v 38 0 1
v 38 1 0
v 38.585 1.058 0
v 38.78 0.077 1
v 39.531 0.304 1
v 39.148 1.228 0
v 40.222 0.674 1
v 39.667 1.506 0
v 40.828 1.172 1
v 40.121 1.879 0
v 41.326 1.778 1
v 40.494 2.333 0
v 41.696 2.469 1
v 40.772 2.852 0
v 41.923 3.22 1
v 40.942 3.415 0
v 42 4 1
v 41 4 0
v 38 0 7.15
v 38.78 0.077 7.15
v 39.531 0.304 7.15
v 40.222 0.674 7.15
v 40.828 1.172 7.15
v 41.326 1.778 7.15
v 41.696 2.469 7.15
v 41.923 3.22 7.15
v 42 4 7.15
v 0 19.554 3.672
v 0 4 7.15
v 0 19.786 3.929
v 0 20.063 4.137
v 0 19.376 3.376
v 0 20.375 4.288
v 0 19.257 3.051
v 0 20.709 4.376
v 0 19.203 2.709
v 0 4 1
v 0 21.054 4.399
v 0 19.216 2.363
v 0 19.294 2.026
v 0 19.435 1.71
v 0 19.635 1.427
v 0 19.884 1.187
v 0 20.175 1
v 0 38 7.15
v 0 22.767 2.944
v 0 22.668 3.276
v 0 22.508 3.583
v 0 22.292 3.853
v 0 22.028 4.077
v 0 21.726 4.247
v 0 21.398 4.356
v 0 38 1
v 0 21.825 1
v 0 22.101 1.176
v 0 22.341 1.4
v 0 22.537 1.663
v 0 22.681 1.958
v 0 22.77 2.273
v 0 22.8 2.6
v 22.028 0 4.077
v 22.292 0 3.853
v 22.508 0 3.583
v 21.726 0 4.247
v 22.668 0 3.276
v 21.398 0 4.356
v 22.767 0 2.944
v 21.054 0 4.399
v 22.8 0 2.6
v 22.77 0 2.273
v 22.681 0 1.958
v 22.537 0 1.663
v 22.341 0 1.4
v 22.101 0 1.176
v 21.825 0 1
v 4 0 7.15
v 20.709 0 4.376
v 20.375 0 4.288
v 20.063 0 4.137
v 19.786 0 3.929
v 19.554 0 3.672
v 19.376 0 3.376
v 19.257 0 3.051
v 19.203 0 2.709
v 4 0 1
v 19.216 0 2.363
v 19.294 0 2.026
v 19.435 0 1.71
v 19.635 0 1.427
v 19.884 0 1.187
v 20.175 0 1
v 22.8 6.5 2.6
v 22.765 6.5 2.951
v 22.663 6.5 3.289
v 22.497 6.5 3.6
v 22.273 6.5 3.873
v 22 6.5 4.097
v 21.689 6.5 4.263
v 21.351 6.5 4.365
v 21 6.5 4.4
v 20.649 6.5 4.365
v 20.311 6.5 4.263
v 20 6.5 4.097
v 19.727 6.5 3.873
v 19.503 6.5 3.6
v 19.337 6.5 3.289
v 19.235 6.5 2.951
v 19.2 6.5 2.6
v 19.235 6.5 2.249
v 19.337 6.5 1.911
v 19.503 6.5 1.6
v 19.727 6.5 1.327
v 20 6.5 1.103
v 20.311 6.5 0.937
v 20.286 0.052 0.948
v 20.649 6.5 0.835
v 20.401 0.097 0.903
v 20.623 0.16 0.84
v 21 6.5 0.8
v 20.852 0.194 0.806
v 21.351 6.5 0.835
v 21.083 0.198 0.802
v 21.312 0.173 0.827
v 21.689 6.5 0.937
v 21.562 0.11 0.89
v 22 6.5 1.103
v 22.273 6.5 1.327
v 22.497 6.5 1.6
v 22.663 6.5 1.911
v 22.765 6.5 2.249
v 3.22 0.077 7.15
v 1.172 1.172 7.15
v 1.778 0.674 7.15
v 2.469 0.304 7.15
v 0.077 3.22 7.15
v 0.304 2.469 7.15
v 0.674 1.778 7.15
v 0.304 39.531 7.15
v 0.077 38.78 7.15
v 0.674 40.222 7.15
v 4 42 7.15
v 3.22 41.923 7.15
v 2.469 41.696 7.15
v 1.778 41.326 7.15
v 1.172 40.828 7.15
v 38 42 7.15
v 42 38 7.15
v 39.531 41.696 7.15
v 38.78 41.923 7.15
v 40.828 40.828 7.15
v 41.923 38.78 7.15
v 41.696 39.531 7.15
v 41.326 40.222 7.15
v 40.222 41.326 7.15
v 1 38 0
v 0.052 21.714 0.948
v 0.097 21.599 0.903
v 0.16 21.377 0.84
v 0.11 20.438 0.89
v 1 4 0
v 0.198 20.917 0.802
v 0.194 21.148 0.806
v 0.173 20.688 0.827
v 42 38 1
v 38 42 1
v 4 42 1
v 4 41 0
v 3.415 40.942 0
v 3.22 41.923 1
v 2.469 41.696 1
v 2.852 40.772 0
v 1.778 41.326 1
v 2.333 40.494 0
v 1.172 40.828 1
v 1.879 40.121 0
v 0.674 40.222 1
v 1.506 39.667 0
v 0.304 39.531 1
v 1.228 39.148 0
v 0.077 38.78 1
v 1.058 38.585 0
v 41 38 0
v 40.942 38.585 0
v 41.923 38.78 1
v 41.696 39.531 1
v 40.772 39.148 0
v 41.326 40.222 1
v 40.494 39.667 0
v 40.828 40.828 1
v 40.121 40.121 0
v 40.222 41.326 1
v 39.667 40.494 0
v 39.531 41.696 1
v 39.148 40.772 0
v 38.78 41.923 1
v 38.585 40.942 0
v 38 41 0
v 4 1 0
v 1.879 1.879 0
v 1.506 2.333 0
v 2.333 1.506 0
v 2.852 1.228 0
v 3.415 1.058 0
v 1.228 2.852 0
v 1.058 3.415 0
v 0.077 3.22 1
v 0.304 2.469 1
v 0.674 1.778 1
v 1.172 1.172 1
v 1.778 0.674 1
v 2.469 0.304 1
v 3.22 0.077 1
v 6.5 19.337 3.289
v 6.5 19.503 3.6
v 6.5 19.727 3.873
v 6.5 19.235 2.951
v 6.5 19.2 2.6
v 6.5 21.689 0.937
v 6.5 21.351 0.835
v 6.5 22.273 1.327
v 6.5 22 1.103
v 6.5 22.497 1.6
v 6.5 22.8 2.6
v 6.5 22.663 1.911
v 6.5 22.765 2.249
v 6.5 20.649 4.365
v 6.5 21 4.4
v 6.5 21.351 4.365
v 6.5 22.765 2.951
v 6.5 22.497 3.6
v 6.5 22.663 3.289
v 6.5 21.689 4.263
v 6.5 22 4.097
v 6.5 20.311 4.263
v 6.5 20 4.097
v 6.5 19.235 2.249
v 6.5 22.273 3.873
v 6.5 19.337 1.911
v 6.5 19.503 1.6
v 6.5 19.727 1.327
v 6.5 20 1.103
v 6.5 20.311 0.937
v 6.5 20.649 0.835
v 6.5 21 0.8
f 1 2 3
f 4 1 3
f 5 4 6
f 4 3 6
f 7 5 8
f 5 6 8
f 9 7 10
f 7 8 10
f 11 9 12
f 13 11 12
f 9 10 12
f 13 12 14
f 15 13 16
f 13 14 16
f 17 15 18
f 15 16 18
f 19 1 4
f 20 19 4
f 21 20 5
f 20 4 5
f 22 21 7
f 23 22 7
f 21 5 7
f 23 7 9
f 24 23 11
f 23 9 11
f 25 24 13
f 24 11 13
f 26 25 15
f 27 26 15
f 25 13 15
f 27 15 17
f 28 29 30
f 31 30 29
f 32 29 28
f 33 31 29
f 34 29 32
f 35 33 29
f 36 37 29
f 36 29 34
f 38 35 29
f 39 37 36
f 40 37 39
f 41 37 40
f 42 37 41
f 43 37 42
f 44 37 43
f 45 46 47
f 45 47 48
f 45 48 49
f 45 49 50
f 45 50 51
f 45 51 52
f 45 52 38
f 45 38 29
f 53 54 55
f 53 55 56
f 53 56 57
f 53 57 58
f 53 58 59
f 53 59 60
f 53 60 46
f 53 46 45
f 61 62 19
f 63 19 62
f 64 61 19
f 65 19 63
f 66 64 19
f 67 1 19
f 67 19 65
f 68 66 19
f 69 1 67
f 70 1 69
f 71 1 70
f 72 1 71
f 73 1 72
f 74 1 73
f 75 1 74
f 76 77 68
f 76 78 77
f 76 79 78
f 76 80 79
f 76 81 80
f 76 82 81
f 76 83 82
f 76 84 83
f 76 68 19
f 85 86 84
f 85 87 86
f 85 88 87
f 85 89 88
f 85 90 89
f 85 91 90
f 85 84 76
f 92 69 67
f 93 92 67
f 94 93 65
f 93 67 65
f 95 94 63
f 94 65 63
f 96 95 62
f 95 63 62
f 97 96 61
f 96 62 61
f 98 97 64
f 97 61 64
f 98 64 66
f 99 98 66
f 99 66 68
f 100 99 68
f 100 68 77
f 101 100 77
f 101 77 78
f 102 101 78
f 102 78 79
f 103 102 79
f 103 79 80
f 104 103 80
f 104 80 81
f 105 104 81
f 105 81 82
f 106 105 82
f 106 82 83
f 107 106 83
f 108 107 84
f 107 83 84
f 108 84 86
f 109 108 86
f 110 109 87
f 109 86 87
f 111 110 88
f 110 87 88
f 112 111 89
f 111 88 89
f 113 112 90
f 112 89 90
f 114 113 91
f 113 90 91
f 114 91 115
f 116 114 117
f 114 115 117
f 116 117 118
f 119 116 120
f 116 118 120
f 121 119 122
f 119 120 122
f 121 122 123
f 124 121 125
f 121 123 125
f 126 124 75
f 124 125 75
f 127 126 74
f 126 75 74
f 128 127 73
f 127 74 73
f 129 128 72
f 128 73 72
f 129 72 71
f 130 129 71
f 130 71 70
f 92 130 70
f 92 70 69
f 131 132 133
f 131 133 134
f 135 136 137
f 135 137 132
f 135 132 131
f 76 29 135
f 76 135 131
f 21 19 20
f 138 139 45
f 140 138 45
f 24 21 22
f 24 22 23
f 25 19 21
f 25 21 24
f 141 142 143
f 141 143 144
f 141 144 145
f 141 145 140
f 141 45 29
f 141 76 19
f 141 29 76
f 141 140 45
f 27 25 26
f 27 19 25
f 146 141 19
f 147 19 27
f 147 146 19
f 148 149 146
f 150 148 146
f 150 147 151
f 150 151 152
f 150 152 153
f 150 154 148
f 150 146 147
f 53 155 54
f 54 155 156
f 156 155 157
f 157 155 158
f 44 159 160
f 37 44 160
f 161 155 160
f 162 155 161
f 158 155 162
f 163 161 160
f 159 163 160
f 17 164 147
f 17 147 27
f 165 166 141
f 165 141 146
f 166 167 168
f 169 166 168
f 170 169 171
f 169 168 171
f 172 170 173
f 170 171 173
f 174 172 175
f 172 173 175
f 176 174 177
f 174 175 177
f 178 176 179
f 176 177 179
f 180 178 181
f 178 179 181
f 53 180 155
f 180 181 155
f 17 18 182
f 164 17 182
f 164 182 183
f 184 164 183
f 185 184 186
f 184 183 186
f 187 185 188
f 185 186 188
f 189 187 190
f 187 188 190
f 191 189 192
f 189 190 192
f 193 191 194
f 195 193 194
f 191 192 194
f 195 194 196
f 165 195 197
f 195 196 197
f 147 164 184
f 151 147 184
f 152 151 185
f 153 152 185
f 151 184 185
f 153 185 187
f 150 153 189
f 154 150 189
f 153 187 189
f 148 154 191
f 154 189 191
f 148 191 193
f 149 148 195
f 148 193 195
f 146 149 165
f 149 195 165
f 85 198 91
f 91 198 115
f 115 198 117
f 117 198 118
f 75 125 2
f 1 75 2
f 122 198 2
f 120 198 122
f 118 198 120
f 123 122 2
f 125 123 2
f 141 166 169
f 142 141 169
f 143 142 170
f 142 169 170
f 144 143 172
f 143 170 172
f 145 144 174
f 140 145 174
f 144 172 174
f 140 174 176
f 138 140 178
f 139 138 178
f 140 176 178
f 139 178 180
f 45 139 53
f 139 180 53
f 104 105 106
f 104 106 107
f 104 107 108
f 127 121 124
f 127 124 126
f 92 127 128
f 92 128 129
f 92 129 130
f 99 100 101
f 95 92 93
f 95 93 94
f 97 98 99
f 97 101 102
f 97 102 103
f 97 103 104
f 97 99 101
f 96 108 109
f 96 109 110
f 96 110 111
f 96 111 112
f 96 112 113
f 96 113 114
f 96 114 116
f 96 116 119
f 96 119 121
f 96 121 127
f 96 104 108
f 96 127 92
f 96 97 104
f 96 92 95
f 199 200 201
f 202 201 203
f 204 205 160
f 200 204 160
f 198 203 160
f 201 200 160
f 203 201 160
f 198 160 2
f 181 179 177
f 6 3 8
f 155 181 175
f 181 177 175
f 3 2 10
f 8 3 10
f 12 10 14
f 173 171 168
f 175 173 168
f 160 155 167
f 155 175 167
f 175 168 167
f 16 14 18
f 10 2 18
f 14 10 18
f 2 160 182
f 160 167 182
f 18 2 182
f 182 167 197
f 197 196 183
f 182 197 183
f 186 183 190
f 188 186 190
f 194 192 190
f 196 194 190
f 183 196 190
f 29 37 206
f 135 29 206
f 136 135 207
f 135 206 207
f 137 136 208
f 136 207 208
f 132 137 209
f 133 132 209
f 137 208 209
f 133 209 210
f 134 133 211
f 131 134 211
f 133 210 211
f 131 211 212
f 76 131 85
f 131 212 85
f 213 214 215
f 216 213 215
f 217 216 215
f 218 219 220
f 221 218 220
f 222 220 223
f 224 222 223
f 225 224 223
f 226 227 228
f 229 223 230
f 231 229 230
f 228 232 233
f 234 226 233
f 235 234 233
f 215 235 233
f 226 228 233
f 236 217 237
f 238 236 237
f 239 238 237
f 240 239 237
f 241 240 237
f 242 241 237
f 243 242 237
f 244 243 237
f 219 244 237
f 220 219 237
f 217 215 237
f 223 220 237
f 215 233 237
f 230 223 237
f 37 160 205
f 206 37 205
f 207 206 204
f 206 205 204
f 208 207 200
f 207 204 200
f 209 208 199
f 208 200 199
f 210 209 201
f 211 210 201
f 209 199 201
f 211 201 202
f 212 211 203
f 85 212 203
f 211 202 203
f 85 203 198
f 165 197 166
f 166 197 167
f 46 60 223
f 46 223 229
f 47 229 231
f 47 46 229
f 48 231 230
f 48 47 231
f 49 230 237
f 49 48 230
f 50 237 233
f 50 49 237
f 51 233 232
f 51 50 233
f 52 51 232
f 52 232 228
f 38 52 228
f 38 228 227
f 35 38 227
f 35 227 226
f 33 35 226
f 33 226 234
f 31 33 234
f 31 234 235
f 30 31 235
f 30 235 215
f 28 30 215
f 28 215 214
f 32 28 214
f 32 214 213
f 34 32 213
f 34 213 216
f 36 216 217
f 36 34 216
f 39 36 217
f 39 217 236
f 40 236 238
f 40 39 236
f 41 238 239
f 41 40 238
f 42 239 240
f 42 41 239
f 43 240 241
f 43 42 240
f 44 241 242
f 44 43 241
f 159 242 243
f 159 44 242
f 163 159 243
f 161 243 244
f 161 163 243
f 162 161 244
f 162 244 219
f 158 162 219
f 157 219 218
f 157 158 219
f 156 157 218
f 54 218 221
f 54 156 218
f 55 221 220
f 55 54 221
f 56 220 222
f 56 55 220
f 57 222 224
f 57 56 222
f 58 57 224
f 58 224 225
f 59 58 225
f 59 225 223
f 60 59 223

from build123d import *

# Parameters (mm, degrees)
PAD031_DEPTH           = 7.15
CHAMFER003_SIZE        = 1
SKETCH126_R            = 1.8
POCKET033_DEPTH        = 5
SKETCH135_R            = 1.8
POCKET038_DEPTH        = 5
LINEARPATTERN032_COUNT = 1
LINEARPATTERN032_PITCH = 0
LINEARPATTERN033_COUNT = 1
LINEARPATTERN033_PITCH = 0
SKETCH136_R            = 1.8
POCKET039_DEPTH        = 5
SKETCH137_R            = 1.8
POCKET040_DEPTH        = 5


with BuildPart() as part:
    # Sketch127 → Pad031 (new body)
    with BuildSketch(Plane.XY):
        with BuildLine():
            ThreePointArc((4, 42), (1.171573, 40.828427), (0, 38))
            Line((0, 4), (0, 38))
            ThreePointArc((0, 4), (1.171573, 1.171573), (4, 0))
            Line((38, 0), (4, 0))
            ThreePointArc((38, 0), (40.828427, 1.171573), (42, 4))
            Line((42, 38), (42, 4))
            ThreePointArc((42, 38), (40.828427, 40.828427), (38, 42))
            Line((4, 42), (38, 42))
        make_face()
    extrude(amount=PAD031_DEPTH)

    # Chamfer003
    chamfer003_edges = [part.edges().sort_by_distance(p)[0] for p in [
        (1.171573, 1.171573, 0),
        (0, 21, 0),
        (21, 0, 0),
        (40.828427, 1.171573, 0),
        (42, 21, 0),
        (40.828427, 40.828427, 0),
        (21, 42, 0),
        (1.171573, 40.828427, 0),
    ]]
    chamfer(chamfer003_edges, length=CHAMFER003_SIZE)

    # Sketch126 → Pocket033 (cut)
    with BuildSketch(Plane.XZ):
        with Locations((21, 2.6)):
            Circle(SKETCH126_R)
    pocket033 = extrude(amount=-POCKET033_DEPTH, mode=Mode.SUBTRACT)

    # Sketch135 → Pocket038 (cut)
    with BuildSketch(Plane.YZ):
        with Locations((21, 2.6)):
            Circle(SKETCH135_R)
    pocket038 = extrude(amount=POCKET038_DEPTH, mode=Mode.SUBTRACT)

    # LinearPattern032: Pocket033 ×1
    with Locations(*[(i * LINEARPATTERN032_PITCH, 0, 0) for i in range(1, LINEARPATTERN032_COUNT)]):
        add(pocket033, mode=Mode.SUBTRACT)

    # LinearPattern033: Pocket038 ×1
    with Locations(*[(0, i * LINEARPATTERN033_PITCH, 0) for i in range(1, LINEARPATTERN033_COUNT)]):
        add(pocket038, mode=Mode.SUBTRACT)

    # Sketch136 → Pocket039 (cut)
    with BuildSketch(Plane.XZ.offset(-1.5)):
        with Locations((21, 2.6)):
            Circle(SKETCH136_R)
    extrude(amount=-POCKET039_DEPTH, mode=Mode.SUBTRACT)

    # Sketch137 → Pocket040 (cut)
    with BuildSketch(Plane.YZ.offset(1.5)):
        with Locations((21, 2.6)):
            Circle(SKETCH137_R)
    extrude(amount=POCKET040_DEPTH, mode=Mode.SUBTRACT)


solid = part.part
